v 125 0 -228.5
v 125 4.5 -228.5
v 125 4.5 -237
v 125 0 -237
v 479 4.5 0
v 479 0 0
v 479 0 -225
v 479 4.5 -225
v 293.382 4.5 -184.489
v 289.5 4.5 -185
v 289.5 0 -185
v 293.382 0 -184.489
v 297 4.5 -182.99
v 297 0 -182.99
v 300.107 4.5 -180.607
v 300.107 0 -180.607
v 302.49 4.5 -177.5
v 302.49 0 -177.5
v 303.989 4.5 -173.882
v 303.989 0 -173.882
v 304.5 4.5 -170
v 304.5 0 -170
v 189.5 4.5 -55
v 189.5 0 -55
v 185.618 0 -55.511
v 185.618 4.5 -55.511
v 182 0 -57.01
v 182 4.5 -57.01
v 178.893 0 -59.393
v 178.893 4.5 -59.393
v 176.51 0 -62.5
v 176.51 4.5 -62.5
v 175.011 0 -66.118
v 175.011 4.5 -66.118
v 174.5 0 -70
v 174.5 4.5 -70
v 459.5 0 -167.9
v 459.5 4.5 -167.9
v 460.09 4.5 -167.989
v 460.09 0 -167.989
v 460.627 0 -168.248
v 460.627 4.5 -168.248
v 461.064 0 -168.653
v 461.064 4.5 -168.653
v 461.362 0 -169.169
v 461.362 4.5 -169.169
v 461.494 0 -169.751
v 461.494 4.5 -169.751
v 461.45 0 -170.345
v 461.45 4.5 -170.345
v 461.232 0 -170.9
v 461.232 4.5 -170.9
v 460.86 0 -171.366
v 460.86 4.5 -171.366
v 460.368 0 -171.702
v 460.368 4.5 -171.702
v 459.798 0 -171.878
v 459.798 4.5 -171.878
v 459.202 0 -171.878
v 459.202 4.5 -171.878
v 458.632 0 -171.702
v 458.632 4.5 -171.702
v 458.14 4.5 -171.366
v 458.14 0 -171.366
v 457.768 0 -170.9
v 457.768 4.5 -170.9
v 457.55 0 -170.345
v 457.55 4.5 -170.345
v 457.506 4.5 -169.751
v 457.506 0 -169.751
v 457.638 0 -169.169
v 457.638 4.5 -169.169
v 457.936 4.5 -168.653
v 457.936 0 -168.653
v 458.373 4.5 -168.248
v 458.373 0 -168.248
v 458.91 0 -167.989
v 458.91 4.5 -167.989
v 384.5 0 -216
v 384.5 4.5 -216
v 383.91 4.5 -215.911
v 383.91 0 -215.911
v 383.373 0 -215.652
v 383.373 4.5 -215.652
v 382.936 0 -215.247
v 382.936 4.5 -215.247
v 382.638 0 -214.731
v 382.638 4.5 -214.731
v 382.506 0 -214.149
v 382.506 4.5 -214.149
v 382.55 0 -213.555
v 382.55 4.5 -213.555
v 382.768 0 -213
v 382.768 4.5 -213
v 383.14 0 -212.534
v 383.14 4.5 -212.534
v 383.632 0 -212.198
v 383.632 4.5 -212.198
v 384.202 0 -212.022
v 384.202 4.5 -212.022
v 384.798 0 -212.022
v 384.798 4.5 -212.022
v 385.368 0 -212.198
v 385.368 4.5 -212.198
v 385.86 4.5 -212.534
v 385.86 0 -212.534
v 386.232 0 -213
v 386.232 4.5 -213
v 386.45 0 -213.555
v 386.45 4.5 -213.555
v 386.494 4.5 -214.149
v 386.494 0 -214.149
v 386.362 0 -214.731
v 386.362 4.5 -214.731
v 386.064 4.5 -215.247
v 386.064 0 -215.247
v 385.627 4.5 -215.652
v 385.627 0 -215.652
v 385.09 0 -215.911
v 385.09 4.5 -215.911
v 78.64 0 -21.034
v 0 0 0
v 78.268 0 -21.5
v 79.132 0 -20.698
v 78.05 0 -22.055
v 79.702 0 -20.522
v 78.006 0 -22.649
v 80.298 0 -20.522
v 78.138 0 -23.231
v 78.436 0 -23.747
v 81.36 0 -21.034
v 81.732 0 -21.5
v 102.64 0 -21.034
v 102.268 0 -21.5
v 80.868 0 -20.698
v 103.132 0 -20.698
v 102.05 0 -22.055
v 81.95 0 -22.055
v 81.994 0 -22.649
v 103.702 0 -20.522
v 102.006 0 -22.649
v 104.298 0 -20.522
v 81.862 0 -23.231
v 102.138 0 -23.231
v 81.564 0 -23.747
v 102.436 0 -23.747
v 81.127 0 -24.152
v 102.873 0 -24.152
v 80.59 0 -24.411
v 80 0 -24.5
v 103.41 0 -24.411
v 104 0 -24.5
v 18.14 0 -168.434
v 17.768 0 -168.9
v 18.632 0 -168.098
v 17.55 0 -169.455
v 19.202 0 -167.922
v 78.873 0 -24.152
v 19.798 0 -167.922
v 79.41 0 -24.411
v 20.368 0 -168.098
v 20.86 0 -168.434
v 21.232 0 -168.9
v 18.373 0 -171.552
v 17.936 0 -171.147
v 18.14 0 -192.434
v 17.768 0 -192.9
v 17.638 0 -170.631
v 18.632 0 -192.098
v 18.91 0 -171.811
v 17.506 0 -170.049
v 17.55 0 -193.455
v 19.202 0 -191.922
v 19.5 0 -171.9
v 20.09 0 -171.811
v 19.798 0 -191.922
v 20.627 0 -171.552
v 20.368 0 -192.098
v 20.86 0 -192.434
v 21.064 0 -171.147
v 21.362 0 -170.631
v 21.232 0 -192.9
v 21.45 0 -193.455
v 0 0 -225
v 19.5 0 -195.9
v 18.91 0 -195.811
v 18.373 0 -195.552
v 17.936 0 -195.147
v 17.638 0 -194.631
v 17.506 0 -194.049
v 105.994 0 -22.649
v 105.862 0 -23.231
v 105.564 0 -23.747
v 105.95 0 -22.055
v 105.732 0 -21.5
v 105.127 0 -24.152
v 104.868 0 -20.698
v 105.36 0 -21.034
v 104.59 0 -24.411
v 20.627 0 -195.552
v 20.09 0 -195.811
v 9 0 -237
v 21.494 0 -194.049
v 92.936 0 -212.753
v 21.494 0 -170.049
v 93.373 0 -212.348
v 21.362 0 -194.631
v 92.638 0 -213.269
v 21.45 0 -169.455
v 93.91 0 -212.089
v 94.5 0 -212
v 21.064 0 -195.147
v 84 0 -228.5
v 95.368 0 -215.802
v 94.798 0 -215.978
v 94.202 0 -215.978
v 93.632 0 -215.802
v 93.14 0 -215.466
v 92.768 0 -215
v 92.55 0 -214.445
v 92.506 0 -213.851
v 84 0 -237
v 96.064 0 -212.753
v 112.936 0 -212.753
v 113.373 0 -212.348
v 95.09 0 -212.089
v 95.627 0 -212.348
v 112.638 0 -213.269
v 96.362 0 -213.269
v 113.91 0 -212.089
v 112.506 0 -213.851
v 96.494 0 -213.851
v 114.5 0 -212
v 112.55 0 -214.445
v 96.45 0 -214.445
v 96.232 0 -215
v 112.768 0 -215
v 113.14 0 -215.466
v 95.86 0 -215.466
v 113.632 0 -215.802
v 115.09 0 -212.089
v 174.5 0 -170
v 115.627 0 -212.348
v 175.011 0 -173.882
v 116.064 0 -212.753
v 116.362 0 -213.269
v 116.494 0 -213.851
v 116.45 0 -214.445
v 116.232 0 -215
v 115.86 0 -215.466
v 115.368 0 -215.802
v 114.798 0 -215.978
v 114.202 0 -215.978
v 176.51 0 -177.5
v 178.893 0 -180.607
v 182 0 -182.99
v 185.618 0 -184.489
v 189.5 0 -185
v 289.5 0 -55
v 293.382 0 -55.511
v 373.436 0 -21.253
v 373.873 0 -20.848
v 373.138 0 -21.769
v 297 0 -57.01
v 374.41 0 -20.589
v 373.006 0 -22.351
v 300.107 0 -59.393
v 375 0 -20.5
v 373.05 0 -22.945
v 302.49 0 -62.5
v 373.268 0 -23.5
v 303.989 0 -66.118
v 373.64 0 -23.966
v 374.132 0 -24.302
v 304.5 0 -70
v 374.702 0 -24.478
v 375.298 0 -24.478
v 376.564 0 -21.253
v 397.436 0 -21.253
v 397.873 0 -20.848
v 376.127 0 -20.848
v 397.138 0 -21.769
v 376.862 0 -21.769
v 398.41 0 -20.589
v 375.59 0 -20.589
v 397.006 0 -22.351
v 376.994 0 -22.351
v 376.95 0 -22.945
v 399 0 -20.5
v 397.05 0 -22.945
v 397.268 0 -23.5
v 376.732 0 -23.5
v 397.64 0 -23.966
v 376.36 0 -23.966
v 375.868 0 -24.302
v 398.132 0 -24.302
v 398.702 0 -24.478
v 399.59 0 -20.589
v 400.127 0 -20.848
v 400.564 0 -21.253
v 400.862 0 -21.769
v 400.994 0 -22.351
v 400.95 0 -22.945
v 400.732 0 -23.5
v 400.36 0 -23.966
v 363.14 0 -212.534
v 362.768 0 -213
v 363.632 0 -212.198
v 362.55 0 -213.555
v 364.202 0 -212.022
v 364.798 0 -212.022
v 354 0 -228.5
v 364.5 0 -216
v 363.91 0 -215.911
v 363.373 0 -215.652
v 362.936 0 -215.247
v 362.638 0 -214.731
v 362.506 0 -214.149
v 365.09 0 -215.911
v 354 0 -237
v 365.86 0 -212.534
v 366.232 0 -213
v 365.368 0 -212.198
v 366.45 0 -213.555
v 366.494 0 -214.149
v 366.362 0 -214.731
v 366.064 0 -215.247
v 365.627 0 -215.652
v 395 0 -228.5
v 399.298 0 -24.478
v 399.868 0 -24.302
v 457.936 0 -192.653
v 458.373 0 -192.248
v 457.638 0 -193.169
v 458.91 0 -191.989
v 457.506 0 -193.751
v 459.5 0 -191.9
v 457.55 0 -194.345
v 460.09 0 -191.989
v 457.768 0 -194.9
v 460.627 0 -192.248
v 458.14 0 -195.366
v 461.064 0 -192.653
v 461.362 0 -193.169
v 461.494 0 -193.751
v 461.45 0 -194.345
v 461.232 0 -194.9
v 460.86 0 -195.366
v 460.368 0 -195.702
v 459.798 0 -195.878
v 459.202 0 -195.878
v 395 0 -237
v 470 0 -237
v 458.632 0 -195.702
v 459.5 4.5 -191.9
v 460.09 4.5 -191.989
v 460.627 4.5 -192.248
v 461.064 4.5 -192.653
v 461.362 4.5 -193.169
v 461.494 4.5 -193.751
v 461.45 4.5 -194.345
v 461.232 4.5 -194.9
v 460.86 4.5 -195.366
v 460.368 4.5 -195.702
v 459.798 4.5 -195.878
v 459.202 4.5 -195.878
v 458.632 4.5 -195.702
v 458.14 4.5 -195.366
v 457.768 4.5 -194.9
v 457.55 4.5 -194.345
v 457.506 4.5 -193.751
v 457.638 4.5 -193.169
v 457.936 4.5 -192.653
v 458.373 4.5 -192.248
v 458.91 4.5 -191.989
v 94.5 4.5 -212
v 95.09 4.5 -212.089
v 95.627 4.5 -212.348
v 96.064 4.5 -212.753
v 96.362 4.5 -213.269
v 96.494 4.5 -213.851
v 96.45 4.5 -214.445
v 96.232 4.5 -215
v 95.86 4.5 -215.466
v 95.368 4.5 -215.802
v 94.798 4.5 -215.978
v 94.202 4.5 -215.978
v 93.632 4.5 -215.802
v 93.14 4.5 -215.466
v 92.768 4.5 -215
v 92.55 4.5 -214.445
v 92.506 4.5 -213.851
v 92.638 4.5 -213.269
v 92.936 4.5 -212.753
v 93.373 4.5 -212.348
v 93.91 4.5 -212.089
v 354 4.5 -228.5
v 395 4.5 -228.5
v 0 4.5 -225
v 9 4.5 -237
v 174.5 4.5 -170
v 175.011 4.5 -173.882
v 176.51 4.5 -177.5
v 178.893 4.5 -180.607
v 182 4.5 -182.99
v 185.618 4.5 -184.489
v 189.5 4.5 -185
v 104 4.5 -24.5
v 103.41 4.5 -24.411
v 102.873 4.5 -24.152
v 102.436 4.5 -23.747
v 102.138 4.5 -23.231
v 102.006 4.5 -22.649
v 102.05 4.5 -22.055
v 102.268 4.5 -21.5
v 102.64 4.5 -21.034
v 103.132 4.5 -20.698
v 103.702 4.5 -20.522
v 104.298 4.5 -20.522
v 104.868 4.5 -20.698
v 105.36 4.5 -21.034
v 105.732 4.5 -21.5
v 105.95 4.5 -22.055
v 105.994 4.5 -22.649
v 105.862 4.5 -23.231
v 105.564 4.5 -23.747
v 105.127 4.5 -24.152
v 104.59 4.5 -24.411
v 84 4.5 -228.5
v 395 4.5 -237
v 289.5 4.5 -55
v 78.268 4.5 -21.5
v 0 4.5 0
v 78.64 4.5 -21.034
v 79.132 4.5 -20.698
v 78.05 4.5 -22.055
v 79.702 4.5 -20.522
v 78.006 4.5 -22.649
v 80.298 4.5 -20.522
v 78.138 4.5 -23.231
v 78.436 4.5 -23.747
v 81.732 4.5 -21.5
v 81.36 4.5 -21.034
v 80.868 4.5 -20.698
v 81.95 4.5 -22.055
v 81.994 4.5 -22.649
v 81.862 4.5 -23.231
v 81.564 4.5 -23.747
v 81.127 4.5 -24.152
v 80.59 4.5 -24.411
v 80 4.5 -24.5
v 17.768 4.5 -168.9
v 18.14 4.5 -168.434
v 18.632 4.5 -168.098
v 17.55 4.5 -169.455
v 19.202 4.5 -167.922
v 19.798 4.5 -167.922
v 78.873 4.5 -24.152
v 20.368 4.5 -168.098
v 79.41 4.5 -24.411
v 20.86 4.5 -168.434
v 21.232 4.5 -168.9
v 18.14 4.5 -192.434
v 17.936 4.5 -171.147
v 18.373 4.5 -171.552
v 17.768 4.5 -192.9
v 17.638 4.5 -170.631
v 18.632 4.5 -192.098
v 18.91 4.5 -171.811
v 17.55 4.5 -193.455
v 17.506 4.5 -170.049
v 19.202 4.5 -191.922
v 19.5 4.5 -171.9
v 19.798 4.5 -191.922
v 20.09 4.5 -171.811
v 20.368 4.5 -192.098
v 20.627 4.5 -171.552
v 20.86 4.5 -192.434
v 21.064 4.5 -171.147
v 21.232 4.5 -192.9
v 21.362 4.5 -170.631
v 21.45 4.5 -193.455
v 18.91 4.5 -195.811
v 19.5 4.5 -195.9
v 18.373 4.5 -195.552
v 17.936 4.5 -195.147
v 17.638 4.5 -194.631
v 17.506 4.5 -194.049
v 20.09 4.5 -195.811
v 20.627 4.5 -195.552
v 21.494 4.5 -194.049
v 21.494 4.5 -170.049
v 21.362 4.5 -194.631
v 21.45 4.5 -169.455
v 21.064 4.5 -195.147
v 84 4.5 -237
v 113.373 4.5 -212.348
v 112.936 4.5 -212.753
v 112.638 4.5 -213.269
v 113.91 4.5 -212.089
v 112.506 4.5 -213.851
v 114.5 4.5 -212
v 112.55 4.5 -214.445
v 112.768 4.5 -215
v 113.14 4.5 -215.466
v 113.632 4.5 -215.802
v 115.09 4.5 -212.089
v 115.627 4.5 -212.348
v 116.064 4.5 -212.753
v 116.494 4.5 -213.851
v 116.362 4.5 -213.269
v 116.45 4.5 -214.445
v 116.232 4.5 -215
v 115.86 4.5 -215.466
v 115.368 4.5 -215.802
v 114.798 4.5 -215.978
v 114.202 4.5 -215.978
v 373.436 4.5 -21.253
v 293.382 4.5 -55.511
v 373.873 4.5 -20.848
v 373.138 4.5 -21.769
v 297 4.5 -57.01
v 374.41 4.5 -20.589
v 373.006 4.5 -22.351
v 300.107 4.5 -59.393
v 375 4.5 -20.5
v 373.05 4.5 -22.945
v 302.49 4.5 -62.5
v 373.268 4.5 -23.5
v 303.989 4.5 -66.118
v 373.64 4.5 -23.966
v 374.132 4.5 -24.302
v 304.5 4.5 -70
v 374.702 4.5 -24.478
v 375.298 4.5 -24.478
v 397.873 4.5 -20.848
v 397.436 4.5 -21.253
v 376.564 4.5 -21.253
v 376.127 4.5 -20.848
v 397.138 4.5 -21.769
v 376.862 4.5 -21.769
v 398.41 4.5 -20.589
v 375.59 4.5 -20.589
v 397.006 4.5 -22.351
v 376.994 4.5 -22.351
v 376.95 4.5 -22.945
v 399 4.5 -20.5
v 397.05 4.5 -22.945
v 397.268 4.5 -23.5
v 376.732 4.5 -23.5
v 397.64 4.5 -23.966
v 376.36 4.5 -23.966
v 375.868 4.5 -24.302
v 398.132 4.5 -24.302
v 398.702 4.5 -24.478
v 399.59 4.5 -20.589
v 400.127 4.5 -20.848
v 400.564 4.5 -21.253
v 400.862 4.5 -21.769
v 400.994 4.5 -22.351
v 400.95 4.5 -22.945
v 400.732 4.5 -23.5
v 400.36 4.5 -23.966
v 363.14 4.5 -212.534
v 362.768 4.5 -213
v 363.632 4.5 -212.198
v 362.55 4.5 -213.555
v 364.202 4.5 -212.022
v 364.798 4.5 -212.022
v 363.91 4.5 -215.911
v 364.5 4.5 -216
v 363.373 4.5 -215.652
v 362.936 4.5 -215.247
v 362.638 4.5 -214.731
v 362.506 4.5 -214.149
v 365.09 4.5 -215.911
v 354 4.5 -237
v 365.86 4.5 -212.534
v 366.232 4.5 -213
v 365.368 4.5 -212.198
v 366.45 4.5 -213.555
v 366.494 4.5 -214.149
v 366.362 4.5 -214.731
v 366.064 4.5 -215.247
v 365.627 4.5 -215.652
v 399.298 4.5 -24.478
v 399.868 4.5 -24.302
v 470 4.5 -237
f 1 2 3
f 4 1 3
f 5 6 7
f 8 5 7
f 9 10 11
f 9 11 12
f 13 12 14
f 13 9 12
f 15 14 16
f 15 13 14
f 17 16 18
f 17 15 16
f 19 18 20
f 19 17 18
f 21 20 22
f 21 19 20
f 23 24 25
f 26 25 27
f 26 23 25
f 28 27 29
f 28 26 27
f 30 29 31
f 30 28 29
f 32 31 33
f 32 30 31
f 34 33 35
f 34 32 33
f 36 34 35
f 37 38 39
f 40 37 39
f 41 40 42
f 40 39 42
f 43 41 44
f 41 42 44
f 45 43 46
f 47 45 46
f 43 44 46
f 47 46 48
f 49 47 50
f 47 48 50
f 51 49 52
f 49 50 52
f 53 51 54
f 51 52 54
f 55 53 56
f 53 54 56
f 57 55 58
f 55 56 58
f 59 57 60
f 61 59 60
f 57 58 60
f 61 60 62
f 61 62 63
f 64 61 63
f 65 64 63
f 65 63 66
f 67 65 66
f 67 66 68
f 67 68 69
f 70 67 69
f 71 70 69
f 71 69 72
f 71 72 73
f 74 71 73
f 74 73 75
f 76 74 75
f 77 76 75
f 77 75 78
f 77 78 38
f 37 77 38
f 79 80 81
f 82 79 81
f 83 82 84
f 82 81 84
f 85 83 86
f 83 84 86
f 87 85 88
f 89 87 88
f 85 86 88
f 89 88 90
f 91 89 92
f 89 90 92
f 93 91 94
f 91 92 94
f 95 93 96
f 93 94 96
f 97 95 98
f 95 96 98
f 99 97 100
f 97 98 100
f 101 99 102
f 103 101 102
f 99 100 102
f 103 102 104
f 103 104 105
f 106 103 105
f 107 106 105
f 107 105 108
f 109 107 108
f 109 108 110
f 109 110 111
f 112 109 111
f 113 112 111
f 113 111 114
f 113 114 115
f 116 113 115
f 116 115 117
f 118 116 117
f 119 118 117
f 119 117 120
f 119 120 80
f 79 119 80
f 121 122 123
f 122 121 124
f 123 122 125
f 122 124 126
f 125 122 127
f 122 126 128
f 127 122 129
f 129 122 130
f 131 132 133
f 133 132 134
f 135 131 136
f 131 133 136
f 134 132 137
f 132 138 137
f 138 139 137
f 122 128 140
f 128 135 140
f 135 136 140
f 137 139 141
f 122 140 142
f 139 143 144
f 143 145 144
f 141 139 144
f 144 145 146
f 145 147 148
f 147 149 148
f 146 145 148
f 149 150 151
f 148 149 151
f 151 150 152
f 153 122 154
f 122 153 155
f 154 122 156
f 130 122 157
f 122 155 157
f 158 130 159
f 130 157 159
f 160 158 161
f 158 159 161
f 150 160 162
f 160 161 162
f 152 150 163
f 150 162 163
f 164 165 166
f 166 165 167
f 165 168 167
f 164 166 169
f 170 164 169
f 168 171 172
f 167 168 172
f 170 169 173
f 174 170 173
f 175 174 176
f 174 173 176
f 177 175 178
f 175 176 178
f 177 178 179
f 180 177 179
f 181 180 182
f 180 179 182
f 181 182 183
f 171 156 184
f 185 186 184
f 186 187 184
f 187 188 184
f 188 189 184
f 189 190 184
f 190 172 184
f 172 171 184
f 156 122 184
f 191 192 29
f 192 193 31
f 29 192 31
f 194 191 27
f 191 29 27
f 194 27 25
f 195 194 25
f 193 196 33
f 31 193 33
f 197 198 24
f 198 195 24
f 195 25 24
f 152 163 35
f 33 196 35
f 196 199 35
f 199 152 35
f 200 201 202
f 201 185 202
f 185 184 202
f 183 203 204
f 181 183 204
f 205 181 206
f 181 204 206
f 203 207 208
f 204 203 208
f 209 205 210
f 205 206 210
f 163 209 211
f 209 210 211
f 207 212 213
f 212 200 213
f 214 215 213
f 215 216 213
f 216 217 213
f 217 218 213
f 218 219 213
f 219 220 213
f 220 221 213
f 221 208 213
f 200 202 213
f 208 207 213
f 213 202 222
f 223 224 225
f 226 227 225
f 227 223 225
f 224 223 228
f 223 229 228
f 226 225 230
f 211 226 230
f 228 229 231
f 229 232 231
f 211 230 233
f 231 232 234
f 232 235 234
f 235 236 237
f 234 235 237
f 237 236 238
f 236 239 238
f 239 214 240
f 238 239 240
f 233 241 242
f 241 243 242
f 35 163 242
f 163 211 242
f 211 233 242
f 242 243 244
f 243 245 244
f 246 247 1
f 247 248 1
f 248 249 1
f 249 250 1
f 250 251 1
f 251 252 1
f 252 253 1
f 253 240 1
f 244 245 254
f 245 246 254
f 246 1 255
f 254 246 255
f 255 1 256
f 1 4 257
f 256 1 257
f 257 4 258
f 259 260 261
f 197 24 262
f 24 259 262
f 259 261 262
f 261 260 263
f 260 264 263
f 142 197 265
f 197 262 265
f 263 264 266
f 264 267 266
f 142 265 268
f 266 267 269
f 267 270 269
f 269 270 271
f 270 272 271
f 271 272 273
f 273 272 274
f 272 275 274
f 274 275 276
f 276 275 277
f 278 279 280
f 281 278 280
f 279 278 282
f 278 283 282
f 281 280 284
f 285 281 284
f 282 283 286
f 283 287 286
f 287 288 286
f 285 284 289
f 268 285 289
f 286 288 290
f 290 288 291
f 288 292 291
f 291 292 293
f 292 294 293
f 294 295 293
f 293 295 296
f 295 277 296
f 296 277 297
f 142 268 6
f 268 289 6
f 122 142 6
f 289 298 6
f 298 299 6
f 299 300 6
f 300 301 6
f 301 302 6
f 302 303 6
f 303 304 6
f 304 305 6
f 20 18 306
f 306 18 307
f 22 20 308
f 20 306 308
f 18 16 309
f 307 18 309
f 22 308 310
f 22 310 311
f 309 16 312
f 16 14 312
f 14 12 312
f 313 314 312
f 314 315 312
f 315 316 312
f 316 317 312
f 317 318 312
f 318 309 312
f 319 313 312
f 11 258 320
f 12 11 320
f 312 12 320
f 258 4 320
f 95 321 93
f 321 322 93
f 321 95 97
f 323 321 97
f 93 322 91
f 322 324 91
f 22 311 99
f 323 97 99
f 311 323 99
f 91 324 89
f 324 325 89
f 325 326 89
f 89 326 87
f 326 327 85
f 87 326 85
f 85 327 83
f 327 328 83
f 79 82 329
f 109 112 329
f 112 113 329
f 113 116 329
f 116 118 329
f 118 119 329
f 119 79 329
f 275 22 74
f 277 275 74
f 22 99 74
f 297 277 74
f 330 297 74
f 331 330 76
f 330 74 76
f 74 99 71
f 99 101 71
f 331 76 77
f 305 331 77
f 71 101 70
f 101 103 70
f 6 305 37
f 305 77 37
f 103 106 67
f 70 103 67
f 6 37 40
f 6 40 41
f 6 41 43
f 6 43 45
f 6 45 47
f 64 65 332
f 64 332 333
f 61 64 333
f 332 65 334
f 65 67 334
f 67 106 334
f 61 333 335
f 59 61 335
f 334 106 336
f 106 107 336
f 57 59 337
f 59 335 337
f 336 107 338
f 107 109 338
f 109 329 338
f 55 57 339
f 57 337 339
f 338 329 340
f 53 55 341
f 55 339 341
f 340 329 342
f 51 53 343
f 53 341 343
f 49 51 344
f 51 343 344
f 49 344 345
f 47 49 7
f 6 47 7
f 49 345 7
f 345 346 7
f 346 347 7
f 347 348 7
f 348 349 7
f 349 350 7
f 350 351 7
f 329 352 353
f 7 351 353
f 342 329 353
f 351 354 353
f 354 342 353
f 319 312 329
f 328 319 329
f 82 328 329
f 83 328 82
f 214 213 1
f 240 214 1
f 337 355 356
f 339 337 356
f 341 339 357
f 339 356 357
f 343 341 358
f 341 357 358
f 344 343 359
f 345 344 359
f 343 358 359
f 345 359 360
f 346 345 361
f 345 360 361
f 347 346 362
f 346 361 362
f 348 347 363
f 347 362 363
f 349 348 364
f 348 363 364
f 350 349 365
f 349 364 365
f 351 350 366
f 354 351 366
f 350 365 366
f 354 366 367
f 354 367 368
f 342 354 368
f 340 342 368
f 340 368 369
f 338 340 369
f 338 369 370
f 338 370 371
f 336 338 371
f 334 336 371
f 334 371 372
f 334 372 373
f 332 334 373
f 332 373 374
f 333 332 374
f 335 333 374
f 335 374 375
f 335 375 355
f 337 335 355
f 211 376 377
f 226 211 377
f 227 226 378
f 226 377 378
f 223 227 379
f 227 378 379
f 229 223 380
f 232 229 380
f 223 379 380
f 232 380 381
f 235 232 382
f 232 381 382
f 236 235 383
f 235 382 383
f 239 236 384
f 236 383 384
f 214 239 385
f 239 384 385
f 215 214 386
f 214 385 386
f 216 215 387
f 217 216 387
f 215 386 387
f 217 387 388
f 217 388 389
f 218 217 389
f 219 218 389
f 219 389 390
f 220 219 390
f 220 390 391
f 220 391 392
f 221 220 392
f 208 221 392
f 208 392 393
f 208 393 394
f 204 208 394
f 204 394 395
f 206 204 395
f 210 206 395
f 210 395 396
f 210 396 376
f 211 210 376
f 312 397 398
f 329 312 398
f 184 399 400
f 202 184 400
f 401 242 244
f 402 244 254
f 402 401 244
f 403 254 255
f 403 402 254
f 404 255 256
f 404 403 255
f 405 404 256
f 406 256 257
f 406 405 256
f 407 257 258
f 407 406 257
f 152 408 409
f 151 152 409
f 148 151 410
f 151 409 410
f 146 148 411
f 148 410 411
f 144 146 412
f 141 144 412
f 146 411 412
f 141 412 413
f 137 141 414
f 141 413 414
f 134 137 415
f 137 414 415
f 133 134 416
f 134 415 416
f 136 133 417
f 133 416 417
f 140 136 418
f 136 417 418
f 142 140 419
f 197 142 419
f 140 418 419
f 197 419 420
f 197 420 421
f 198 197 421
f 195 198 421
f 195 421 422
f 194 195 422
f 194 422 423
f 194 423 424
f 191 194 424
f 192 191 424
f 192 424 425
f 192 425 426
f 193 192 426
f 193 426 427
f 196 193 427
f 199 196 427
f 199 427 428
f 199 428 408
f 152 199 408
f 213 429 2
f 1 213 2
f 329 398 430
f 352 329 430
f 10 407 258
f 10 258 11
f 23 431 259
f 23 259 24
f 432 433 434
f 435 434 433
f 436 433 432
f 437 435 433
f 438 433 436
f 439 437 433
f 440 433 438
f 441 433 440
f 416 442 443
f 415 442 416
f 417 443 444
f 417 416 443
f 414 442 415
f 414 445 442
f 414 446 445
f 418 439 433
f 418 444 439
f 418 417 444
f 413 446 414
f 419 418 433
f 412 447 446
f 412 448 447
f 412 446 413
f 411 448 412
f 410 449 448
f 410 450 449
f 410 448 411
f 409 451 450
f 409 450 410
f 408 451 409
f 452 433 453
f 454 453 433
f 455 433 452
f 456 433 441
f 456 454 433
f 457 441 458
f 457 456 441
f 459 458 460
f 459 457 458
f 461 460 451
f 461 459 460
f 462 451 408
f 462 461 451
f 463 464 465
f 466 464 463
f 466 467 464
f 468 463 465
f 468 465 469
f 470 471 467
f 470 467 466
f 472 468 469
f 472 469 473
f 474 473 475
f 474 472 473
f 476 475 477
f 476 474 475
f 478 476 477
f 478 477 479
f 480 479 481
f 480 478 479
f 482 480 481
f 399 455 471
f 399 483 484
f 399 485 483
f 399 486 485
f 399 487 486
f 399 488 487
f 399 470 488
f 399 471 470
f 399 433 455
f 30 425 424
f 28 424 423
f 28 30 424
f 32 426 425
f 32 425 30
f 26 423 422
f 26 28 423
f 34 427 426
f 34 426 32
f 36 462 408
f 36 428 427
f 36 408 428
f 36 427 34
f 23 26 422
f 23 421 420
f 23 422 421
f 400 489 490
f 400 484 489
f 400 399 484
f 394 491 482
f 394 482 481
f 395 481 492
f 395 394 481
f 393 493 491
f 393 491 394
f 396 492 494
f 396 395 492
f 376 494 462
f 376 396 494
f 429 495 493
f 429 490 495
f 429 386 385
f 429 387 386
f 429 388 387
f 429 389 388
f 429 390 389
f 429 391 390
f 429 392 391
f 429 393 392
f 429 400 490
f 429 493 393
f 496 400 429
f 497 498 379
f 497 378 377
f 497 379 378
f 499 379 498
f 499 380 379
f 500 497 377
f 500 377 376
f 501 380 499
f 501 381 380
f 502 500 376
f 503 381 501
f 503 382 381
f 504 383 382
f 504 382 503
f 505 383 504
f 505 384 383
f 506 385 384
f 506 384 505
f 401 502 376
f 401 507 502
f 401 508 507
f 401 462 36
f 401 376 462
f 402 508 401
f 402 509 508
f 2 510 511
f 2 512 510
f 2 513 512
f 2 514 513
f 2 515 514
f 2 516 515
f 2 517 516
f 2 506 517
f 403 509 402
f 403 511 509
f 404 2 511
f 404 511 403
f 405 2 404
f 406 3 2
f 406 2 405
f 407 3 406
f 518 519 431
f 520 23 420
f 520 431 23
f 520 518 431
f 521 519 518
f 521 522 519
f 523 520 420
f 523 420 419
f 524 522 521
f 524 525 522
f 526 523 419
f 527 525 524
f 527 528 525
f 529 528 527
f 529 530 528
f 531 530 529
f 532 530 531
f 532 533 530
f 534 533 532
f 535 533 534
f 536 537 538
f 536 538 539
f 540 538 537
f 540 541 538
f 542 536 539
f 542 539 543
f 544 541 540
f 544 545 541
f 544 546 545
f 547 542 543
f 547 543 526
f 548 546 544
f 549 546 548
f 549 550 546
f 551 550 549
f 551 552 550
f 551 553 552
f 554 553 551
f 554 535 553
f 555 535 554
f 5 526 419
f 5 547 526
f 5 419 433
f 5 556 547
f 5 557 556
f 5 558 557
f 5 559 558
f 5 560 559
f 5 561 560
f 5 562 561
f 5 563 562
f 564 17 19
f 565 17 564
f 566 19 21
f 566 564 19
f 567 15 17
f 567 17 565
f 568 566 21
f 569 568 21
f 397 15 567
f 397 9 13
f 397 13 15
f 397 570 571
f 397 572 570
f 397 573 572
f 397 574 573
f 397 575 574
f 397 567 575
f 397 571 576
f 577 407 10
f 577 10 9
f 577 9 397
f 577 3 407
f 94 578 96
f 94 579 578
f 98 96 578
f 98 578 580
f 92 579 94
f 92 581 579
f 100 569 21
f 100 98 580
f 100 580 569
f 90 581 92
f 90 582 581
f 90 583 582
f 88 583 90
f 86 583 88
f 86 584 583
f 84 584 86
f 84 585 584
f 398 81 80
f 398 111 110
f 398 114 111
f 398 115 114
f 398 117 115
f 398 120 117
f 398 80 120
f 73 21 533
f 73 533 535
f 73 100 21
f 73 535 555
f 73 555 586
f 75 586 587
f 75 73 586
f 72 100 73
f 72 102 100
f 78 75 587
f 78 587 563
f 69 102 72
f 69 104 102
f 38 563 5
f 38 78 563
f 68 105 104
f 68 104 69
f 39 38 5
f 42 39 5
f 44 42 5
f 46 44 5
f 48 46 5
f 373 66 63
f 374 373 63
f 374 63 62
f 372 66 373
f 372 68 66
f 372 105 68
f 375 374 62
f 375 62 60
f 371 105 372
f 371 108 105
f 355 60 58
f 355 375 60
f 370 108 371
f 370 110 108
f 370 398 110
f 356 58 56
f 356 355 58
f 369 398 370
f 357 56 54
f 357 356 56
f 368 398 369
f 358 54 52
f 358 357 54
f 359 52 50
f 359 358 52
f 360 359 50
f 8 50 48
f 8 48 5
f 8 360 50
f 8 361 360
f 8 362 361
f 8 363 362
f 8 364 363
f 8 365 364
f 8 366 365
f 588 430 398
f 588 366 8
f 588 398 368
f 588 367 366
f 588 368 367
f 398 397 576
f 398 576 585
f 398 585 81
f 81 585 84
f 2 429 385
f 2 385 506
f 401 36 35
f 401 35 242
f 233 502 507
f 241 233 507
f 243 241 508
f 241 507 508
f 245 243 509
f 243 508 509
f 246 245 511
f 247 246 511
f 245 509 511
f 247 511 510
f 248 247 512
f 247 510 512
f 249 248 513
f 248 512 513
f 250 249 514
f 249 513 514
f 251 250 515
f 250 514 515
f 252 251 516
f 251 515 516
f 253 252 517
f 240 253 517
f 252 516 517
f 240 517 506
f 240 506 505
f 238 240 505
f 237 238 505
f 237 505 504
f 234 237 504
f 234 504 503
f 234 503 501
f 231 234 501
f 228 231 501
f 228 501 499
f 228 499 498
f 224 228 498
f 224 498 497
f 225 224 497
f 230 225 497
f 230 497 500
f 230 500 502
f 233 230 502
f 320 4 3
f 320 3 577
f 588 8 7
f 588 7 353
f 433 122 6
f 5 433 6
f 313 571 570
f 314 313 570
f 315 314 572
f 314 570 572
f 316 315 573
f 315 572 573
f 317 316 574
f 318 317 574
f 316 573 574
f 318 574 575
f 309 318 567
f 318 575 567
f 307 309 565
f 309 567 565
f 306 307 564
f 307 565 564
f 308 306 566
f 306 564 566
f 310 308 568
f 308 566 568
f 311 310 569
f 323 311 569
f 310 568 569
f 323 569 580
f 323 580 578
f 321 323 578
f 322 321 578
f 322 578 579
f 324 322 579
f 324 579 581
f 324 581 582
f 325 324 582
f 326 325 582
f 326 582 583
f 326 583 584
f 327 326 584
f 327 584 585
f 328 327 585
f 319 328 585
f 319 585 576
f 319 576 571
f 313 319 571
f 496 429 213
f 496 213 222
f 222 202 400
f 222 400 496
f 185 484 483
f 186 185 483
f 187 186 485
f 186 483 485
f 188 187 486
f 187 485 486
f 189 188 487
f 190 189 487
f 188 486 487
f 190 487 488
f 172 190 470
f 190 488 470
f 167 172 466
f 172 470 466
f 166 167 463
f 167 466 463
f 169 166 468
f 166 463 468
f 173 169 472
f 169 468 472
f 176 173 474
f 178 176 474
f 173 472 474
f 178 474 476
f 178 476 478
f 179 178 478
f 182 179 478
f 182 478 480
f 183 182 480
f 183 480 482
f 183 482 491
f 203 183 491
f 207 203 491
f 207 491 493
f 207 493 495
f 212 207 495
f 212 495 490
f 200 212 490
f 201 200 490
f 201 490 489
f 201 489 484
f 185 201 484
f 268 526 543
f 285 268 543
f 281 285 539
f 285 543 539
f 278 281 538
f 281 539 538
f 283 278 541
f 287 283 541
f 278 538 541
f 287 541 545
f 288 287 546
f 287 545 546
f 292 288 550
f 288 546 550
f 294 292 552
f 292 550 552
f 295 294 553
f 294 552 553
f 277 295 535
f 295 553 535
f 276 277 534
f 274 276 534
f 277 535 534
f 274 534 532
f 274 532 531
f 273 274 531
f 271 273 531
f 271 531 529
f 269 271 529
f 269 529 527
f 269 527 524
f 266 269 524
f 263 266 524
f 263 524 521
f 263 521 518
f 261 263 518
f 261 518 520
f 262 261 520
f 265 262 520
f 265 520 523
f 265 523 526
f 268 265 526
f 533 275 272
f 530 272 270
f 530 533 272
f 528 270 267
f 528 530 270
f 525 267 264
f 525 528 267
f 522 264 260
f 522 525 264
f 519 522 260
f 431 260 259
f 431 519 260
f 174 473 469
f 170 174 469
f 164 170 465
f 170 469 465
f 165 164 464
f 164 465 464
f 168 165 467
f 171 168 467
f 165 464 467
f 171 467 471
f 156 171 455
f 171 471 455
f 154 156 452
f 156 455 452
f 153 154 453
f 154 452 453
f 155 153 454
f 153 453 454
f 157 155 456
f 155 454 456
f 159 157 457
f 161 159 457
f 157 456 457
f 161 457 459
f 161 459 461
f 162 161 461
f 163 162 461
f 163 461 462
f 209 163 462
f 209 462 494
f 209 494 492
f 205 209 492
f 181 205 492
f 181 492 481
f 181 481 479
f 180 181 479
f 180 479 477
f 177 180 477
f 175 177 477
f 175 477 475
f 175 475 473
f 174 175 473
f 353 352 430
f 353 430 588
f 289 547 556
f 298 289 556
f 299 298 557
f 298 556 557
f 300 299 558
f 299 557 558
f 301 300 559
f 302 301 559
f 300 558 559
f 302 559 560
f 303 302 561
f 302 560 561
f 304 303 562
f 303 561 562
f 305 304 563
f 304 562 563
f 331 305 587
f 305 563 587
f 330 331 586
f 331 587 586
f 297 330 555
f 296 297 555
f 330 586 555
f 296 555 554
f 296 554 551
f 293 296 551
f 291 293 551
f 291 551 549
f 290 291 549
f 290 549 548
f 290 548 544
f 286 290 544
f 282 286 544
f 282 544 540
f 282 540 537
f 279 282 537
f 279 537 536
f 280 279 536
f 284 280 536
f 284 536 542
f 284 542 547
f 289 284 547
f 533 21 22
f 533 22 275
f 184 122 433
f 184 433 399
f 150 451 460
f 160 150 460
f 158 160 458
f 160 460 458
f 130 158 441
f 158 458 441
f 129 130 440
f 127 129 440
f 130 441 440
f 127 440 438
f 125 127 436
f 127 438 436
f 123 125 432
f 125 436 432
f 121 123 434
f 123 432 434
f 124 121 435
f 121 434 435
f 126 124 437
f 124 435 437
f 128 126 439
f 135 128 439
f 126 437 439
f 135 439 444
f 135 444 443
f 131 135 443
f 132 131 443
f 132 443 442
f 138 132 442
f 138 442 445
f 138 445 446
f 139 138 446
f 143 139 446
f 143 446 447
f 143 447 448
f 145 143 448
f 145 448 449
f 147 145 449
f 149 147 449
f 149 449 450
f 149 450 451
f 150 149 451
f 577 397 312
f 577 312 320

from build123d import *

# Parameters (mm, degrees)
SKETCH_1_W          = 479
SKETCH_1_H          = 237
EXTRUDE_1_DEPTH     = 4.5
CUT_EXTRUDE_1_REACH = 536.444
SKETCH_2_R          = 2
SKETCH_2_W          = 41
SKETCH_2_H          = 8.5
CUT_EXTRUDE_2_DEPTH = 10


with BuildPart() as part:
    # 草图1 → 凸台-拉伸1 (new body)
    with BuildSketch(Plane(origin=(0, 0, 0), x_dir=(1, 0, 0), z_dir=(0, 1, 0))):
        with Locations((239.5, 118.5)):
            Rectangle(SKETCH_1_W, SKETCH_1_H)
    extrude(amount=EXTRUDE_1_DEPTH)

    # 草图2 → 切除-拉伸1 (cut, up to next)
    with BuildSketch(Plane(origin=(0, 4.5, 0), x_dir=(1, 0, 0), z_dir=(0, 1, 0)), mode=Mode.PRIVATE) as cut_extrude_1_sk1:
        with Locations(Location((399, 22.5, 0), (0, 0, 270))):
            Circle(SKETCH_2_R)
    cut_extrude_1_tool1 = extrude(cut_extrude_1_sk1.sketch, amount=-CUT_EXTRUDE_1_REACH, mode=Mode.PRIVATE) & part.part
    # 草图2 → 切除-拉伸1 (cut, up to next)
    with BuildSketch(Plane(origin=(0, 4.5, 0), x_dir=(1, 0, 0), z_dir=(0, 1, 0)), mode=Mode.PRIVATE) as cut_extrude_1_sk2:
        with Locations(Location((375, 22.5, 0), (0, 0, 270))):
            Circle(SKETCH_2_R)
    cut_extrude_1_tool2 = extrude(cut_extrude_1_sk2.sketch, amount=-CUT_EXTRUDE_1_REACH, mode=Mode.PRIVATE) & part.part
    # 草图2 → 切除-拉伸1 (cut, up to next)
    with BuildSketch(Plane(origin=(0, 4.5, 0), x_dir=(1, 0, 0), z_dir=(0, 1, 0)), mode=Mode.PRIVATE) as cut_extrude_1_sk3:
        with Locations(Location((104, 22.5, 0), (0, 0, 90))):
            Circle(SKETCH_2_R)
    cut_extrude_1_tool3 = extrude(cut_extrude_1_sk3.sketch, amount=-CUT_EXTRUDE_1_REACH, mode=Mode.PRIVATE) & part.part
    # 草图2 → 切除-拉伸1 (cut, up to next)
    with BuildSketch(Plane(origin=(0, 4.5, 0), x_dir=(1, 0, 0), z_dir=(0, 1, 0)), mode=Mode.PRIVATE) as cut_extrude_1_sk4:
        with Locations(Location((80, 22.5, 0), (0, 0, 90))):
            Circle(SKETCH_2_R)
    cut_extrude_1_tool4 = extrude(cut_extrude_1_sk4.sketch, amount=-CUT_EXTRUDE_1_REACH, mode=Mode.PRIVATE) & part.part
    # 草图2 → 切除-拉伸1 (cut, up to next)
    with BuildSketch(Plane(origin=(0, 4.5, 0), x_dir=(1, 0, 0), z_dir=(0, 1, 0)), mode=Mode.PRIVATE) as cut_extrude_1_sk5:
        with Locations(Location((459.5, 193.9, 0), (0, 0, 270))):
            Circle(SKETCH_2_R)
    cut_extrude_1_tool5 = extrude(cut_extrude_1_sk5.sketch, amount=-CUT_EXTRUDE_1_REACH, mode=Mode.PRIVATE) & part.part
    # 草图2 → 切除-拉伸1 (cut, up to next)
    with BuildSketch(Plane(origin=(0, 4.5, 0), x_dir=(1, 0, 0), z_dir=(0, 1, 0)), mode=Mode.PRIVATE) as cut_extrude_1_sk6:
        with Locations(Location((459.5, 169.9, 0), (0, 0, 270))):
            Circle(SKETCH_2_R)
    cut_extrude_1_tool6 = extrude(cut_extrude_1_sk6.sketch, amount=-CUT_EXTRUDE_1_REACH, mode=Mode.PRIVATE) & part.part
    # 草图2 → 切除-拉伸1 (cut, up to next)
    with BuildSketch(Plane(origin=(0, 4.5, 0), x_dir=(1, 0, 0), z_dir=(0, 1, 0)), mode=Mode.PRIVATE) as cut_extrude_1_sk7:
        with Locations(Location((19.5, 169.9, 0), (0, 0, 90))):
            Circle(SKETCH_2_R)
    cut_extrude_1_tool7 = extrude(cut_extrude_1_sk7.sketch, amount=-CUT_EXTRUDE_1_REACH, mode=Mode.PRIVATE) & part.part
    # 草图2 → 切除-拉伸1 (cut, up to next)
    with BuildSketch(Plane(origin=(0, 4.5, 0), x_dir=(1, 0, 0), z_dir=(0, 1, 0)), mode=Mode.PRIVATE) as cut_extrude_1_sk8:
        with Locations(Location((19.5, 193.9, 0), (0, 0, 90))):
            Circle(SKETCH_2_R)
    cut_extrude_1_tool8 = extrude(cut_extrude_1_sk8.sketch, amount=-CUT_EXTRUDE_1_REACH, mode=Mode.PRIVATE) & part.part
    # 草图2 → 切除-拉伸1 (cut, up to next)
    with BuildSketch(Plane(origin=(0, 4.5, 0), x_dir=(1, 0, 0), z_dir=(0, 1, 0)), mode=Mode.PRIVATE) as cut_extrude_1_sk9:
        with Locations(Location((94.5, 214, 0), (0, 0, 270))):
            Circle(SKETCH_2_R)
    cut_extrude_1_tool9 = extrude(cut_extrude_1_sk9.sketch, amount=-CUT_EXTRUDE_1_REACH, mode=Mode.PRIVATE) & part.part
    # 草图2 → 切除-拉伸1 (cut, up to next)
    with BuildSketch(Plane(origin=(0, 4.5, 0), x_dir=(1, 0, 0), z_dir=(0, 1, 0)), mode=Mode.PRIVATE) as cut_extrude_1_sk10:
        with Locations(Location((114.5, 214, 0), (0, 0, 270))):
            Circle(SKETCH_2_R)
    cut_extrude_1_tool10 = extrude(cut_extrude_1_sk10.sketch, amount=-CUT_EXTRUDE_1_REACH, mode=Mode.PRIVATE) & part.part
    # 草图2 → 切除-拉伸1 (cut, up to next)
    with BuildSketch(Plane(origin=(0, 4.5, 0), x_dir=(1, 0, 0), z_dir=(0, 1, 0)), mode=Mode.PRIVATE) as cut_extrude_1_sk11:
        with Locations(Location((364.5, 214, 0), (0, 0, 90))):
            Circle(SKETCH_2_R)
    cut_extrude_1_tool11 = extrude(cut_extrude_1_sk11.sketch, amount=-CUT_EXTRUDE_1_REACH, mode=Mode.PRIVATE) & part.part
    # 草图2 → 切除-拉伸1 (cut, up to next)
    with BuildSketch(Plane(origin=(0, 4.5, 0), x_dir=(1, 0, 0), z_dir=(0, 1, 0)), mode=Mode.PRIVATE) as cut_extrude_1_sk12:
        with Locations(Location((384.5, 214, 0), (0, 0, 90))):
            Circle(SKETCH_2_R)
    cut_extrude_1_tool12 = extrude(cut_extrude_1_sk12.sketch, amount=-CUT_EXTRUDE_1_REACH, mode=Mode.PRIVATE) & part.part
    # 草图2 → 切除-拉伸1 (cut, up to next)
    with BuildSketch(Plane(origin=(0, 4.5, 0), x_dir=(1, 0, 0), z_dir=(0, 1, 0)), mode=Mode.PRIVATE) as cut_extrude_1_sk13:
        Polygon((0, 237), (0, 225), (9, 237), align=None)
    cut_extrude_1_tool13 = extrude(cut_extrude_1_sk13.sketch, amount=-CUT_EXTRUDE_1_REACH, mode=Mode.PRIVATE) & part.part
    # 草图2 → 切除-拉伸1 (cut, up to next)
    with BuildSketch(Plane(origin=(0, 4.5, 0), x_dir=(1, 0, 0), z_dir=(0, 1, 0)), mode=Mode.PRIVATE) as cut_extrude_1_sk14:
        Polygon((470, 237), (479, 237), (479, 225), align=None)
    cut_extrude_1_tool14 = extrude(cut_extrude_1_sk14.sketch, amount=-CUT_EXTRUDE_1_REACH, mode=Mode.PRIVATE) & part.part
    # 草图2 → 切除-拉伸1 (cut, up to next)
    with BuildSketch(Plane(origin=(0, 4.5, 0), x_dir=(1, 0, 0), z_dir=(0, 1, 0)), mode=Mode.PRIVATE) as cut_extrude_1_sk15:
        with Locations((104.5, 232.75)):
            Rectangle(SKETCH_2_W, SKETCH_2_H)
    cut_extrude_1_tool15 = extrude(cut_extrude_1_sk15.sketch, amount=-CUT_EXTRUDE_1_REACH, mode=Mode.PRIVATE) & part.part
    # 草图2 → 切除-拉伸1 (cut, up to next)
    with BuildSketch(Plane(origin=(0, 4.5, 0), x_dir=(1, 0, 0), z_dir=(0, 1, 0)), mode=Mode.PRIVATE) as cut_extrude_1_sk16:
        with Locations((374.5, 232.75)):
            Rectangle(SKETCH_2_W, SKETCH_2_H)
    cut_extrude_1_tool16 = extrude(cut_extrude_1_sk16.sketch, amount=-CUT_EXTRUDE_1_REACH, mode=Mode.PRIVATE) & part.part
    add(cut_extrude_1_tool1.solids().sort_by_distance((399, 4.5, -22.5))[0], mode=Mode.SUBTRACT)
    add(cut_extrude_1_tool2.solids().sort_by_distance((375, 4.5, -22.5))[0], mode=Mode.SUBTRACT)
    add(cut_extrude_1_tool3.solids().sort_by_distance((104, 4.5, -22.5))[0], mode=Mode.SUBTRACT)
    add(cut_extrude_1_tool4.solids().sort_by_distance((80, 4.5, -22.5))[0], mode=Mode.SUBTRACT)
    add(cut_extrude_1_tool5.solids().sort_by_distance((459.5, 4.5, -193.9))[0], mode=Mode.SUBTRACT)
    add(cut_extrude_1_tool6.solids().sort_by_distance((459.5, 4.5, -169.9))[0], mode=Mode.SUBTRACT)
    add(cut_extrude_1_tool7.solids().sort_by_distance((19.5, 4.5, -169.9))[0], mode=Mode.SUBTRACT)
    add(cut_extrude_1_tool8.solids().sort_by_distance((19.5, 4.5, -193.9))[0], mode=Mode.SUBTRACT)
    add(cut_extrude_1_tool9.solids().sort_by_distance((94.5, 4.5, -214))[0], mode=Mode.SUBTRACT)
    add(cut_extrude_1_tool10.solids().sort_by_distance((114.5, 4.5, -214))[0], mode=Mode.SUBTRACT)
    add(cut_extrude_1_tool11.solids().sort_by_distance((364.5, 4.5, -214))[0], mode=Mode.SUBTRACT)
    add(cut_extrude_1_tool12.solids().sort_by_distance((384.5, 4.5, -214))[0], mode=Mode.SUBTRACT)
    add(cut_extrude_1_tool13.solids().sort_by_distance((3, 4.5, -233))[0], mode=Mode.SUBTRACT)
    add(cut_extrude_1_tool14.solids().sort_by_distance((476, 4.5, -233))[0], mode=Mode.SUBTRACT)
    add(cut_extrude_1_tool15.solids().sort_by_distance((104.5, 4.5, -232.75))[0], mode=Mode.SUBTRACT)
    add(cut_extrude_1_tool16.solids().sort_by_distance((374.5, 4.5, -232.75))[0], mode=Mode.SUBTRACT)

    # 草图3 → 切除-拉伸2 (cut)
    with BuildSketch(Plane(origin=(0, 4.5, 0), x_dir=(1, 0, 0), z_dir=(0, 1, 0))):
        with BuildLine():
            Line((289.5, 55), (189.5, 55))
            ThreePointArc((189.5, 55), (178.893398282, 59.393398282), (174.5, 70))
            Line((174.5, 70), (174.5, 170))
            ThreePointArc((174.5, 170), (178.893398282, 180.606601718), (189.5, 185))
            Line((189.5, 185), (289.5, 185))
            ThreePointArc((289.5, 185), (300.106601718, 180.606601718), (304.5, 170))
            Line((304.5, 170), (304.5, 70))
            ThreePointArc((304.5, 70), (300.106601718, 59.393398282), (289.5, 55))
        make_face()
    extrude(amount=-CUT_EXTRUDE_2_DEPTH, mode=Mode.SUBTRACT)


solid = part.part
